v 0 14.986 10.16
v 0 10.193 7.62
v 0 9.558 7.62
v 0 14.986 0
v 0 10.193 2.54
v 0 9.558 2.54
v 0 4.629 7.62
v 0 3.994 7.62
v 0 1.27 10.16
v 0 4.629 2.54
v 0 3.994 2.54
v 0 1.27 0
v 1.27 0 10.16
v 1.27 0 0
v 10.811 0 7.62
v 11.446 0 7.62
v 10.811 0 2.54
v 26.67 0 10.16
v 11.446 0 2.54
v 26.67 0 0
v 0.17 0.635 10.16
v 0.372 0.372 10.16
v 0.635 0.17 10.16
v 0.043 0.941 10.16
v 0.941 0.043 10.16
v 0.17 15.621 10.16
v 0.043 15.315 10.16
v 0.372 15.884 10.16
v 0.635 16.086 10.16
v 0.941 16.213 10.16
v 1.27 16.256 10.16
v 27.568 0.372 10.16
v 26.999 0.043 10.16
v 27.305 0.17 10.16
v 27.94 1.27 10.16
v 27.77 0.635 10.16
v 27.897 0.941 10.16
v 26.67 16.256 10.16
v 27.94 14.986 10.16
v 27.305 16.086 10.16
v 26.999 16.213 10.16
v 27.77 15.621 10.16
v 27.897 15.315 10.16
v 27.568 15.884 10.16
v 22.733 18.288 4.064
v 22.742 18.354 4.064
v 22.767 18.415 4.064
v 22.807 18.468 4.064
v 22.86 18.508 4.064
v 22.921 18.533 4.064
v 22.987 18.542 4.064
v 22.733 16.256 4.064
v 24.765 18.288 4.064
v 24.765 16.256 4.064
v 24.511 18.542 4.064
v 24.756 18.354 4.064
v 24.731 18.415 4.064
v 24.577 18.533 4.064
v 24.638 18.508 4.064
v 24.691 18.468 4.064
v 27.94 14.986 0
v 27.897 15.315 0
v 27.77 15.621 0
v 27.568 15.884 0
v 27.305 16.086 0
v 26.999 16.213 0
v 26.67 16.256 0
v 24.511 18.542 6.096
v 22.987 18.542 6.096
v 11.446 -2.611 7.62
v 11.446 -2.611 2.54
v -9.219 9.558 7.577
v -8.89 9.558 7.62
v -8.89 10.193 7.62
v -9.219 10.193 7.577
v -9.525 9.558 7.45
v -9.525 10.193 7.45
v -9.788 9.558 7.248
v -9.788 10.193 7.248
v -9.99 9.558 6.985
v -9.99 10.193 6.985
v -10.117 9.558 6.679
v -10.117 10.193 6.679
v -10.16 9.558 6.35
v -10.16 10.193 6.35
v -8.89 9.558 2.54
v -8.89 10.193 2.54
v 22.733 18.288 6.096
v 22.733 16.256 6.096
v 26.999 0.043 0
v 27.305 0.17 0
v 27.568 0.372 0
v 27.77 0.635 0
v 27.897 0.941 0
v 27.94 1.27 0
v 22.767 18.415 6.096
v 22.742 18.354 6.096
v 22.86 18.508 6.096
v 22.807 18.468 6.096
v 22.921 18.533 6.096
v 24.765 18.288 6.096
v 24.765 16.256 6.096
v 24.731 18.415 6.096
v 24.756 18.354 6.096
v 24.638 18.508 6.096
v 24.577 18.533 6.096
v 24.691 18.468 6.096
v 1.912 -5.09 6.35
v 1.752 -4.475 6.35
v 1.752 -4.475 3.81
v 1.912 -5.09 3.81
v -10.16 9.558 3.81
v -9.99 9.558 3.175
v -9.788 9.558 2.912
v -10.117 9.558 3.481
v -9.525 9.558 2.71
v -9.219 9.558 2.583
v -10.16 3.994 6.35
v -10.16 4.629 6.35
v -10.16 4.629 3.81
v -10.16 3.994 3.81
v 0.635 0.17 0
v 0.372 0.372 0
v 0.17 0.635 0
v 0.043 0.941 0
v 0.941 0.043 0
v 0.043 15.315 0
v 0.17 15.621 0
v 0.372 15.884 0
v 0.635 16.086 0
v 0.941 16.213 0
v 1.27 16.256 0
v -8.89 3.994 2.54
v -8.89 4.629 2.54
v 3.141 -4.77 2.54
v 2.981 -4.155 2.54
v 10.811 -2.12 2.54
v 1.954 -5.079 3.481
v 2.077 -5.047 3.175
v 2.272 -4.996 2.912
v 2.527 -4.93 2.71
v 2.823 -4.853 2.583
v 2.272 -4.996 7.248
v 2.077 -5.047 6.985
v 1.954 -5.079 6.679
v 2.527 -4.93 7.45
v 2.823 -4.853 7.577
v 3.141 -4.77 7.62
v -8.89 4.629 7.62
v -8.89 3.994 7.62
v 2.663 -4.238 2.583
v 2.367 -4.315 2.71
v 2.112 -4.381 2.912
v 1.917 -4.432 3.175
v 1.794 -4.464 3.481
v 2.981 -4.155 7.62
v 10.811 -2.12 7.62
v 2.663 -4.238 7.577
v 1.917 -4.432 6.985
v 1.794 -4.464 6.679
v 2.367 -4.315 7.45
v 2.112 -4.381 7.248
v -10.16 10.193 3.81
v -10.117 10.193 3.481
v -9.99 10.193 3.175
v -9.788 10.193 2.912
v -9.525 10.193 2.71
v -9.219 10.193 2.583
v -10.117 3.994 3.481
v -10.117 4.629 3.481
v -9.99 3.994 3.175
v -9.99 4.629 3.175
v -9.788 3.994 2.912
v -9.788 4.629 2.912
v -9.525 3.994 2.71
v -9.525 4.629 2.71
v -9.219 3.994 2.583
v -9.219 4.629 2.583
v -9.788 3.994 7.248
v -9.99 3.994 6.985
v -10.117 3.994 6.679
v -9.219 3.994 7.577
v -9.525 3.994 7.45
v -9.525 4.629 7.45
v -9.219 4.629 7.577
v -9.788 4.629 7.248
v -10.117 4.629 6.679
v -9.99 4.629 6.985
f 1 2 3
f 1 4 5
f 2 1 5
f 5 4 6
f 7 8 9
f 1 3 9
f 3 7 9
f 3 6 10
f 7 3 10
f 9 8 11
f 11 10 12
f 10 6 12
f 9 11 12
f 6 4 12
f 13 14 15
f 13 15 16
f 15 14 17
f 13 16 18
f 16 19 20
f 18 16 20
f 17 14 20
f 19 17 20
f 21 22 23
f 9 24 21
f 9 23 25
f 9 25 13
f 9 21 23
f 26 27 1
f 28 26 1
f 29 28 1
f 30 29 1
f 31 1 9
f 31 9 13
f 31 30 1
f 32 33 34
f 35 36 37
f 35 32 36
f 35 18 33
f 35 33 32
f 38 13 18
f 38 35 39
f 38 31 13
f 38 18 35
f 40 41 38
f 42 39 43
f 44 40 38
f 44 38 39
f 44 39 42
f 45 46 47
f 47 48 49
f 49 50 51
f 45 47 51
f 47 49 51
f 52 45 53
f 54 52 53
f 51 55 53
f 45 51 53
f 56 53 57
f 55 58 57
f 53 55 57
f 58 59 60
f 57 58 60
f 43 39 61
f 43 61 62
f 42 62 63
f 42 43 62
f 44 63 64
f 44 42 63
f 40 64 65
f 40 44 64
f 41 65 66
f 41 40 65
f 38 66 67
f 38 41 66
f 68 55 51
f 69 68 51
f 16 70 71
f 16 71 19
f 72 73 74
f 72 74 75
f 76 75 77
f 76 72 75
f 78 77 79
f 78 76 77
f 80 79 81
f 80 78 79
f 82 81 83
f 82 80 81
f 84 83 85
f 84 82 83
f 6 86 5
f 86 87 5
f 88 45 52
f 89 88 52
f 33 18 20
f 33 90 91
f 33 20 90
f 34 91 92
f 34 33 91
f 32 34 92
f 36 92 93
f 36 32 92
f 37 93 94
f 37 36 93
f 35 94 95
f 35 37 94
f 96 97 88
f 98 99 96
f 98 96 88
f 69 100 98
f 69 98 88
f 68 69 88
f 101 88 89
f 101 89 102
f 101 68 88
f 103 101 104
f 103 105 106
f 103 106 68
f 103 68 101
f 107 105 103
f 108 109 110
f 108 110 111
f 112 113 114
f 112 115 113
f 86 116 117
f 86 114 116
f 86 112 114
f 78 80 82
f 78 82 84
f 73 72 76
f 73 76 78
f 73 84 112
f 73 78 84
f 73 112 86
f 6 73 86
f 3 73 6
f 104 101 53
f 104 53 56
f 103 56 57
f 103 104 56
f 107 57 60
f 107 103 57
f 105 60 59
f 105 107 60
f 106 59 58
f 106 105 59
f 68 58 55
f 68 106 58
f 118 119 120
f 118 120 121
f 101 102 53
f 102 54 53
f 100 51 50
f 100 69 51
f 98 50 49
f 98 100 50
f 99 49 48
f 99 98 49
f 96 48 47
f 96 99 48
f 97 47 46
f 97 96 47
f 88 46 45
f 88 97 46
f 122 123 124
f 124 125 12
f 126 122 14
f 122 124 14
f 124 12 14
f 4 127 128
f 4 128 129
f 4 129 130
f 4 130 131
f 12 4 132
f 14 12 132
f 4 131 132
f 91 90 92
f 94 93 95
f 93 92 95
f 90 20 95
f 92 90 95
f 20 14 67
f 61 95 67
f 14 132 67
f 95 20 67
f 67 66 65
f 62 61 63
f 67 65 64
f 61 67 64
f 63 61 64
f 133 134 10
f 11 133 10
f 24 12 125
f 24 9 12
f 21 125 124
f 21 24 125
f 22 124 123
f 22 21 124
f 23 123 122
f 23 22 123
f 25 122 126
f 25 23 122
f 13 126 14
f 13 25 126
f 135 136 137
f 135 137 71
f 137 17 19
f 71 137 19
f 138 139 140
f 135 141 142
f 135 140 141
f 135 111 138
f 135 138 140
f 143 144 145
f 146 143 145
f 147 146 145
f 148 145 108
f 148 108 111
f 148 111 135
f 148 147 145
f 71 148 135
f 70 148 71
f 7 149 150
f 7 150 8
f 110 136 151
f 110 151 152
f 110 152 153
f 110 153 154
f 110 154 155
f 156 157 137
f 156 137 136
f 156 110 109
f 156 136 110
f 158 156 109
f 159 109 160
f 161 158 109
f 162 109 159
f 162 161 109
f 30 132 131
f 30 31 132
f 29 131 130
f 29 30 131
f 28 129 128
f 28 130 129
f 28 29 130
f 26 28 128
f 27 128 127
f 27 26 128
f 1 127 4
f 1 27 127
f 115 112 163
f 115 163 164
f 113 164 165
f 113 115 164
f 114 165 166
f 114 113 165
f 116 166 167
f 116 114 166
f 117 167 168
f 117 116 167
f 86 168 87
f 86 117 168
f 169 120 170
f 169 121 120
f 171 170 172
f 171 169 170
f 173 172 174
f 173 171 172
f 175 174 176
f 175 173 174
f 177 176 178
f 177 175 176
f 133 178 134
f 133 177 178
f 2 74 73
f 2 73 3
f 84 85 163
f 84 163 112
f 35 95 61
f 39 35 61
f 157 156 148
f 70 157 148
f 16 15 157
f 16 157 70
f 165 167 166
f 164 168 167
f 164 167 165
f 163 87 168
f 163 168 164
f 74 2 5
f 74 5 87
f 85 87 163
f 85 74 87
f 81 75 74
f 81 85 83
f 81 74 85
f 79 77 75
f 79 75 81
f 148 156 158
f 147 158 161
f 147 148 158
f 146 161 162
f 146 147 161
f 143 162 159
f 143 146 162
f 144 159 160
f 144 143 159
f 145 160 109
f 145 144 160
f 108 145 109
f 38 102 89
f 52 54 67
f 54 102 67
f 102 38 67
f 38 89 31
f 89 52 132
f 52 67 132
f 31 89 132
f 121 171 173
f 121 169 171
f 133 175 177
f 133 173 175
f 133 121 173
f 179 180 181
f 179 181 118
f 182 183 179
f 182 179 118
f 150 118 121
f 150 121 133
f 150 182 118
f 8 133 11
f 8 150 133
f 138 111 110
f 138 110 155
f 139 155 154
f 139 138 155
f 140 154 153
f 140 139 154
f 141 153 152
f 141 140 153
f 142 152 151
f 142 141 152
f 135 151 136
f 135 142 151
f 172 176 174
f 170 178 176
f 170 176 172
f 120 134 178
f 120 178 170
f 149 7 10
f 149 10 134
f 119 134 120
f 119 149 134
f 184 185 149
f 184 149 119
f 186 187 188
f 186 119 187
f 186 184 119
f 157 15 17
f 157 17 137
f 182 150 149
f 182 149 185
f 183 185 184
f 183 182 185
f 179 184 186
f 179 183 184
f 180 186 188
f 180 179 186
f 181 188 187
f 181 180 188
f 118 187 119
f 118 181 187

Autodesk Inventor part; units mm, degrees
ref_plane "YZ Plane" through (0, 0, 0) normal (1, 0, 0) x (0, 1, 0)
sketch "Sketch1" plane through (0, 0, 0) normal (0, 0, 1) x (1, 0, 0)
  line L0 (0, 0) -> (27.94, 0)
  line L1 (27.94, 0) -> (27.94, 16.256)
  line L2 (27.94, 16.256) -> (0, 16.256)
  line L3 (0, 16.256) -> (0, 0)
  dimension "d0" = 27.94
  dimension "d1" = 16.256
extrude "Extrusion1" add sketch "Sketch1" along normal blind 10.16
fillet "Fillet1" radius 1.27 4 edges at (0, 16.256, 5.08) (27.94, 16.256, 5.08) (27.94, 0, 5.08) (0, 0, 5.08)
sketch "Sketch3" plane through (0, 0, 10.16) normal (0, 0, 1) x (1, 0, 0)
  arc A0 (0, 1.27) -> (1.27, 0) centre (1.27, 1.27) ccw projected
  line L0 (1.27, 0) -> (26.67, 0) projected
  arc A1 (26.67, 0) -> (27.94, 1.27) centre (26.67, 1.27) ccw projected
  line L1 (27.94, 1.27) -> (27.94, 14.986) projected
  arc A2 (27.94, 14.986) -> (26.67, 16.256) centre (26.67, 14.986) ccw projected
  line L2 (26.67, 16.256) -> (1.27, 16.256) projected
  arc A3 (1.27, 16.256) -> (0, 14.986) centre (1.27, 14.986) ccw projected
  line L3 (0, 14.986) -> (0, 1.27) projected
  line L4 (26.67, 16.256) -> (1.27, 16.256) projected
  line L5 (24.765, 16.256) -> (24.765, 18.542)
  line L6 (24.765, 18.542) -> (22.733, 18.542)
  line L7 (22.733, 18.542) -> (22.733, 16.256)
  point P0 (0, 0)
  dimension "d12" = 2.286
  dimension "d13" = 2.032
  dimension "d14" = 3.175
ref_plane "Work Plane1" through (0, 0, 5.08) normal (0, 0, 1) x (1, 0, 0)
sketch "Sketch4" plane through (0, 0, 5.08) normal (0, 0, 1) x (1, 0, 0)
  line L0 (24.765, 18.542) -> (22.733, 18.542) projected
  line L1 (22.733, 18.542) -> (22.733, 16.256) projected
  line L2 (24.765, 16.256) -> (24.765, 18.542) projected
  line L3 (22.733, 16.256) -> (24.765, 16.256)
  line L4 (26.67, 16.256) -> (1.27, 16.256) projected
  point P0 (0, 0)
extrude "Extrusion3" add sketch "Sketch4" along normal mid plane 2.032
fillet "Fillet2" radius 0.254 2 edges at (24.765, 18.542, 5.08) (22.733, 18.542, 5.08)
ref_plane "Work Plane2" through (0, 0, 7.62) normal (0, 0, 1) x (1, 0, 0)
sketch "Sketch5" plane through (0, 0, 7.62) normal (0, 0, 1) x (1, 0, 0)
  arc A0 (0, 1.27) -> (1.27, 0) centre (1.27, 1.27) ccw projected
  line L0 (1.27, 0) -> (26.67, 0) projected
  arc A1 (26.67, 0) -> (27.94, 1.27) centre (26.67, 1.27) ccw projected
  line L1 (27.94, 1.27) -> (27.94, 14.986) projected
  arc A2 (27.94, 14.986) -> (26.67, 16.256) centre (26.67, 14.986) ccw projected
  line L2 (26.67, 16.256) -> (1.27, 16.256) projected
  arc A3 (1.27, 16.256) -> (0, 14.986) centre (1.27, 14.986) ccw projected
  line L3 (0, 14.986) -> (0, 1.27) projected
  line L4 (0, 14.986) -> (0, 1.27) projected
  line L5 (0, 10.1931) -> (-10.16, 10.1931)
  line L6 (-10.16, 10.1931) -> (-10.16, 9.5581)
  line L7 (-10.16, 9.5581) -> (0, 9.5581)
  line L8 (0, 9.5581) -> (0, 10.1931)
  line L9 (0, 4.6288) -> (-10.16, 4.6288)
  line L10 (-10.16, 4.6288) -> (-10.16, 3.9938)
  line L11 (-10.16, 3.9938) -> (0, 3.9938)
  line L12 (0, 3.9938) -> (0, 4.6288)
  line L13 (11.4462, 0) -> (10.8112, 0)
  line L14 (10.8112, 0) -> (10.8112, -2.1198)
  line L15 (10.8112, -2.1198) -> (11.4462, -2.1198)
  line L16 (11.4462, -2.1198) -> (11.4462, 0)
  line L17 (10.8112, -2.1198) -> (1.7523, -4.475)
  line L18 (1.7523, -4.475) -> (1.912, -5.0896)
  line L19 (1.912, -5.0896) -> (11.4462, -2.6109)
  line L20 (11.4462, -2.6109) -> (11.4462, -2.1198)
  point P0 (0, 0)
  dimension "d19" = 10.16
  dimension "d20" = 0.635
  dimension "d21" = 0.635
  dimension "d22" = 0.635
extrude "Extrusion4" add sketch "Sketch5" against normal blind 5.08 contours L11 L10 L9 L3 | L0 L16 L15 L14 | L15 L20 L19 L18 L17 | L7 L6 L5 L3
fillet "Fillet3" radius 1.27 6 edges at (-10.16, 4.3113, 7.62) (-10.16, 9.8756, 7.62) (-10.16, 4.3113, 2.54) (-10.16, 9.8756, 2.54) (1.8322, -4.7823, 7.62) (1.8322, -4.7823, 2.54)
properties part number "LIMIT SWITCH"
